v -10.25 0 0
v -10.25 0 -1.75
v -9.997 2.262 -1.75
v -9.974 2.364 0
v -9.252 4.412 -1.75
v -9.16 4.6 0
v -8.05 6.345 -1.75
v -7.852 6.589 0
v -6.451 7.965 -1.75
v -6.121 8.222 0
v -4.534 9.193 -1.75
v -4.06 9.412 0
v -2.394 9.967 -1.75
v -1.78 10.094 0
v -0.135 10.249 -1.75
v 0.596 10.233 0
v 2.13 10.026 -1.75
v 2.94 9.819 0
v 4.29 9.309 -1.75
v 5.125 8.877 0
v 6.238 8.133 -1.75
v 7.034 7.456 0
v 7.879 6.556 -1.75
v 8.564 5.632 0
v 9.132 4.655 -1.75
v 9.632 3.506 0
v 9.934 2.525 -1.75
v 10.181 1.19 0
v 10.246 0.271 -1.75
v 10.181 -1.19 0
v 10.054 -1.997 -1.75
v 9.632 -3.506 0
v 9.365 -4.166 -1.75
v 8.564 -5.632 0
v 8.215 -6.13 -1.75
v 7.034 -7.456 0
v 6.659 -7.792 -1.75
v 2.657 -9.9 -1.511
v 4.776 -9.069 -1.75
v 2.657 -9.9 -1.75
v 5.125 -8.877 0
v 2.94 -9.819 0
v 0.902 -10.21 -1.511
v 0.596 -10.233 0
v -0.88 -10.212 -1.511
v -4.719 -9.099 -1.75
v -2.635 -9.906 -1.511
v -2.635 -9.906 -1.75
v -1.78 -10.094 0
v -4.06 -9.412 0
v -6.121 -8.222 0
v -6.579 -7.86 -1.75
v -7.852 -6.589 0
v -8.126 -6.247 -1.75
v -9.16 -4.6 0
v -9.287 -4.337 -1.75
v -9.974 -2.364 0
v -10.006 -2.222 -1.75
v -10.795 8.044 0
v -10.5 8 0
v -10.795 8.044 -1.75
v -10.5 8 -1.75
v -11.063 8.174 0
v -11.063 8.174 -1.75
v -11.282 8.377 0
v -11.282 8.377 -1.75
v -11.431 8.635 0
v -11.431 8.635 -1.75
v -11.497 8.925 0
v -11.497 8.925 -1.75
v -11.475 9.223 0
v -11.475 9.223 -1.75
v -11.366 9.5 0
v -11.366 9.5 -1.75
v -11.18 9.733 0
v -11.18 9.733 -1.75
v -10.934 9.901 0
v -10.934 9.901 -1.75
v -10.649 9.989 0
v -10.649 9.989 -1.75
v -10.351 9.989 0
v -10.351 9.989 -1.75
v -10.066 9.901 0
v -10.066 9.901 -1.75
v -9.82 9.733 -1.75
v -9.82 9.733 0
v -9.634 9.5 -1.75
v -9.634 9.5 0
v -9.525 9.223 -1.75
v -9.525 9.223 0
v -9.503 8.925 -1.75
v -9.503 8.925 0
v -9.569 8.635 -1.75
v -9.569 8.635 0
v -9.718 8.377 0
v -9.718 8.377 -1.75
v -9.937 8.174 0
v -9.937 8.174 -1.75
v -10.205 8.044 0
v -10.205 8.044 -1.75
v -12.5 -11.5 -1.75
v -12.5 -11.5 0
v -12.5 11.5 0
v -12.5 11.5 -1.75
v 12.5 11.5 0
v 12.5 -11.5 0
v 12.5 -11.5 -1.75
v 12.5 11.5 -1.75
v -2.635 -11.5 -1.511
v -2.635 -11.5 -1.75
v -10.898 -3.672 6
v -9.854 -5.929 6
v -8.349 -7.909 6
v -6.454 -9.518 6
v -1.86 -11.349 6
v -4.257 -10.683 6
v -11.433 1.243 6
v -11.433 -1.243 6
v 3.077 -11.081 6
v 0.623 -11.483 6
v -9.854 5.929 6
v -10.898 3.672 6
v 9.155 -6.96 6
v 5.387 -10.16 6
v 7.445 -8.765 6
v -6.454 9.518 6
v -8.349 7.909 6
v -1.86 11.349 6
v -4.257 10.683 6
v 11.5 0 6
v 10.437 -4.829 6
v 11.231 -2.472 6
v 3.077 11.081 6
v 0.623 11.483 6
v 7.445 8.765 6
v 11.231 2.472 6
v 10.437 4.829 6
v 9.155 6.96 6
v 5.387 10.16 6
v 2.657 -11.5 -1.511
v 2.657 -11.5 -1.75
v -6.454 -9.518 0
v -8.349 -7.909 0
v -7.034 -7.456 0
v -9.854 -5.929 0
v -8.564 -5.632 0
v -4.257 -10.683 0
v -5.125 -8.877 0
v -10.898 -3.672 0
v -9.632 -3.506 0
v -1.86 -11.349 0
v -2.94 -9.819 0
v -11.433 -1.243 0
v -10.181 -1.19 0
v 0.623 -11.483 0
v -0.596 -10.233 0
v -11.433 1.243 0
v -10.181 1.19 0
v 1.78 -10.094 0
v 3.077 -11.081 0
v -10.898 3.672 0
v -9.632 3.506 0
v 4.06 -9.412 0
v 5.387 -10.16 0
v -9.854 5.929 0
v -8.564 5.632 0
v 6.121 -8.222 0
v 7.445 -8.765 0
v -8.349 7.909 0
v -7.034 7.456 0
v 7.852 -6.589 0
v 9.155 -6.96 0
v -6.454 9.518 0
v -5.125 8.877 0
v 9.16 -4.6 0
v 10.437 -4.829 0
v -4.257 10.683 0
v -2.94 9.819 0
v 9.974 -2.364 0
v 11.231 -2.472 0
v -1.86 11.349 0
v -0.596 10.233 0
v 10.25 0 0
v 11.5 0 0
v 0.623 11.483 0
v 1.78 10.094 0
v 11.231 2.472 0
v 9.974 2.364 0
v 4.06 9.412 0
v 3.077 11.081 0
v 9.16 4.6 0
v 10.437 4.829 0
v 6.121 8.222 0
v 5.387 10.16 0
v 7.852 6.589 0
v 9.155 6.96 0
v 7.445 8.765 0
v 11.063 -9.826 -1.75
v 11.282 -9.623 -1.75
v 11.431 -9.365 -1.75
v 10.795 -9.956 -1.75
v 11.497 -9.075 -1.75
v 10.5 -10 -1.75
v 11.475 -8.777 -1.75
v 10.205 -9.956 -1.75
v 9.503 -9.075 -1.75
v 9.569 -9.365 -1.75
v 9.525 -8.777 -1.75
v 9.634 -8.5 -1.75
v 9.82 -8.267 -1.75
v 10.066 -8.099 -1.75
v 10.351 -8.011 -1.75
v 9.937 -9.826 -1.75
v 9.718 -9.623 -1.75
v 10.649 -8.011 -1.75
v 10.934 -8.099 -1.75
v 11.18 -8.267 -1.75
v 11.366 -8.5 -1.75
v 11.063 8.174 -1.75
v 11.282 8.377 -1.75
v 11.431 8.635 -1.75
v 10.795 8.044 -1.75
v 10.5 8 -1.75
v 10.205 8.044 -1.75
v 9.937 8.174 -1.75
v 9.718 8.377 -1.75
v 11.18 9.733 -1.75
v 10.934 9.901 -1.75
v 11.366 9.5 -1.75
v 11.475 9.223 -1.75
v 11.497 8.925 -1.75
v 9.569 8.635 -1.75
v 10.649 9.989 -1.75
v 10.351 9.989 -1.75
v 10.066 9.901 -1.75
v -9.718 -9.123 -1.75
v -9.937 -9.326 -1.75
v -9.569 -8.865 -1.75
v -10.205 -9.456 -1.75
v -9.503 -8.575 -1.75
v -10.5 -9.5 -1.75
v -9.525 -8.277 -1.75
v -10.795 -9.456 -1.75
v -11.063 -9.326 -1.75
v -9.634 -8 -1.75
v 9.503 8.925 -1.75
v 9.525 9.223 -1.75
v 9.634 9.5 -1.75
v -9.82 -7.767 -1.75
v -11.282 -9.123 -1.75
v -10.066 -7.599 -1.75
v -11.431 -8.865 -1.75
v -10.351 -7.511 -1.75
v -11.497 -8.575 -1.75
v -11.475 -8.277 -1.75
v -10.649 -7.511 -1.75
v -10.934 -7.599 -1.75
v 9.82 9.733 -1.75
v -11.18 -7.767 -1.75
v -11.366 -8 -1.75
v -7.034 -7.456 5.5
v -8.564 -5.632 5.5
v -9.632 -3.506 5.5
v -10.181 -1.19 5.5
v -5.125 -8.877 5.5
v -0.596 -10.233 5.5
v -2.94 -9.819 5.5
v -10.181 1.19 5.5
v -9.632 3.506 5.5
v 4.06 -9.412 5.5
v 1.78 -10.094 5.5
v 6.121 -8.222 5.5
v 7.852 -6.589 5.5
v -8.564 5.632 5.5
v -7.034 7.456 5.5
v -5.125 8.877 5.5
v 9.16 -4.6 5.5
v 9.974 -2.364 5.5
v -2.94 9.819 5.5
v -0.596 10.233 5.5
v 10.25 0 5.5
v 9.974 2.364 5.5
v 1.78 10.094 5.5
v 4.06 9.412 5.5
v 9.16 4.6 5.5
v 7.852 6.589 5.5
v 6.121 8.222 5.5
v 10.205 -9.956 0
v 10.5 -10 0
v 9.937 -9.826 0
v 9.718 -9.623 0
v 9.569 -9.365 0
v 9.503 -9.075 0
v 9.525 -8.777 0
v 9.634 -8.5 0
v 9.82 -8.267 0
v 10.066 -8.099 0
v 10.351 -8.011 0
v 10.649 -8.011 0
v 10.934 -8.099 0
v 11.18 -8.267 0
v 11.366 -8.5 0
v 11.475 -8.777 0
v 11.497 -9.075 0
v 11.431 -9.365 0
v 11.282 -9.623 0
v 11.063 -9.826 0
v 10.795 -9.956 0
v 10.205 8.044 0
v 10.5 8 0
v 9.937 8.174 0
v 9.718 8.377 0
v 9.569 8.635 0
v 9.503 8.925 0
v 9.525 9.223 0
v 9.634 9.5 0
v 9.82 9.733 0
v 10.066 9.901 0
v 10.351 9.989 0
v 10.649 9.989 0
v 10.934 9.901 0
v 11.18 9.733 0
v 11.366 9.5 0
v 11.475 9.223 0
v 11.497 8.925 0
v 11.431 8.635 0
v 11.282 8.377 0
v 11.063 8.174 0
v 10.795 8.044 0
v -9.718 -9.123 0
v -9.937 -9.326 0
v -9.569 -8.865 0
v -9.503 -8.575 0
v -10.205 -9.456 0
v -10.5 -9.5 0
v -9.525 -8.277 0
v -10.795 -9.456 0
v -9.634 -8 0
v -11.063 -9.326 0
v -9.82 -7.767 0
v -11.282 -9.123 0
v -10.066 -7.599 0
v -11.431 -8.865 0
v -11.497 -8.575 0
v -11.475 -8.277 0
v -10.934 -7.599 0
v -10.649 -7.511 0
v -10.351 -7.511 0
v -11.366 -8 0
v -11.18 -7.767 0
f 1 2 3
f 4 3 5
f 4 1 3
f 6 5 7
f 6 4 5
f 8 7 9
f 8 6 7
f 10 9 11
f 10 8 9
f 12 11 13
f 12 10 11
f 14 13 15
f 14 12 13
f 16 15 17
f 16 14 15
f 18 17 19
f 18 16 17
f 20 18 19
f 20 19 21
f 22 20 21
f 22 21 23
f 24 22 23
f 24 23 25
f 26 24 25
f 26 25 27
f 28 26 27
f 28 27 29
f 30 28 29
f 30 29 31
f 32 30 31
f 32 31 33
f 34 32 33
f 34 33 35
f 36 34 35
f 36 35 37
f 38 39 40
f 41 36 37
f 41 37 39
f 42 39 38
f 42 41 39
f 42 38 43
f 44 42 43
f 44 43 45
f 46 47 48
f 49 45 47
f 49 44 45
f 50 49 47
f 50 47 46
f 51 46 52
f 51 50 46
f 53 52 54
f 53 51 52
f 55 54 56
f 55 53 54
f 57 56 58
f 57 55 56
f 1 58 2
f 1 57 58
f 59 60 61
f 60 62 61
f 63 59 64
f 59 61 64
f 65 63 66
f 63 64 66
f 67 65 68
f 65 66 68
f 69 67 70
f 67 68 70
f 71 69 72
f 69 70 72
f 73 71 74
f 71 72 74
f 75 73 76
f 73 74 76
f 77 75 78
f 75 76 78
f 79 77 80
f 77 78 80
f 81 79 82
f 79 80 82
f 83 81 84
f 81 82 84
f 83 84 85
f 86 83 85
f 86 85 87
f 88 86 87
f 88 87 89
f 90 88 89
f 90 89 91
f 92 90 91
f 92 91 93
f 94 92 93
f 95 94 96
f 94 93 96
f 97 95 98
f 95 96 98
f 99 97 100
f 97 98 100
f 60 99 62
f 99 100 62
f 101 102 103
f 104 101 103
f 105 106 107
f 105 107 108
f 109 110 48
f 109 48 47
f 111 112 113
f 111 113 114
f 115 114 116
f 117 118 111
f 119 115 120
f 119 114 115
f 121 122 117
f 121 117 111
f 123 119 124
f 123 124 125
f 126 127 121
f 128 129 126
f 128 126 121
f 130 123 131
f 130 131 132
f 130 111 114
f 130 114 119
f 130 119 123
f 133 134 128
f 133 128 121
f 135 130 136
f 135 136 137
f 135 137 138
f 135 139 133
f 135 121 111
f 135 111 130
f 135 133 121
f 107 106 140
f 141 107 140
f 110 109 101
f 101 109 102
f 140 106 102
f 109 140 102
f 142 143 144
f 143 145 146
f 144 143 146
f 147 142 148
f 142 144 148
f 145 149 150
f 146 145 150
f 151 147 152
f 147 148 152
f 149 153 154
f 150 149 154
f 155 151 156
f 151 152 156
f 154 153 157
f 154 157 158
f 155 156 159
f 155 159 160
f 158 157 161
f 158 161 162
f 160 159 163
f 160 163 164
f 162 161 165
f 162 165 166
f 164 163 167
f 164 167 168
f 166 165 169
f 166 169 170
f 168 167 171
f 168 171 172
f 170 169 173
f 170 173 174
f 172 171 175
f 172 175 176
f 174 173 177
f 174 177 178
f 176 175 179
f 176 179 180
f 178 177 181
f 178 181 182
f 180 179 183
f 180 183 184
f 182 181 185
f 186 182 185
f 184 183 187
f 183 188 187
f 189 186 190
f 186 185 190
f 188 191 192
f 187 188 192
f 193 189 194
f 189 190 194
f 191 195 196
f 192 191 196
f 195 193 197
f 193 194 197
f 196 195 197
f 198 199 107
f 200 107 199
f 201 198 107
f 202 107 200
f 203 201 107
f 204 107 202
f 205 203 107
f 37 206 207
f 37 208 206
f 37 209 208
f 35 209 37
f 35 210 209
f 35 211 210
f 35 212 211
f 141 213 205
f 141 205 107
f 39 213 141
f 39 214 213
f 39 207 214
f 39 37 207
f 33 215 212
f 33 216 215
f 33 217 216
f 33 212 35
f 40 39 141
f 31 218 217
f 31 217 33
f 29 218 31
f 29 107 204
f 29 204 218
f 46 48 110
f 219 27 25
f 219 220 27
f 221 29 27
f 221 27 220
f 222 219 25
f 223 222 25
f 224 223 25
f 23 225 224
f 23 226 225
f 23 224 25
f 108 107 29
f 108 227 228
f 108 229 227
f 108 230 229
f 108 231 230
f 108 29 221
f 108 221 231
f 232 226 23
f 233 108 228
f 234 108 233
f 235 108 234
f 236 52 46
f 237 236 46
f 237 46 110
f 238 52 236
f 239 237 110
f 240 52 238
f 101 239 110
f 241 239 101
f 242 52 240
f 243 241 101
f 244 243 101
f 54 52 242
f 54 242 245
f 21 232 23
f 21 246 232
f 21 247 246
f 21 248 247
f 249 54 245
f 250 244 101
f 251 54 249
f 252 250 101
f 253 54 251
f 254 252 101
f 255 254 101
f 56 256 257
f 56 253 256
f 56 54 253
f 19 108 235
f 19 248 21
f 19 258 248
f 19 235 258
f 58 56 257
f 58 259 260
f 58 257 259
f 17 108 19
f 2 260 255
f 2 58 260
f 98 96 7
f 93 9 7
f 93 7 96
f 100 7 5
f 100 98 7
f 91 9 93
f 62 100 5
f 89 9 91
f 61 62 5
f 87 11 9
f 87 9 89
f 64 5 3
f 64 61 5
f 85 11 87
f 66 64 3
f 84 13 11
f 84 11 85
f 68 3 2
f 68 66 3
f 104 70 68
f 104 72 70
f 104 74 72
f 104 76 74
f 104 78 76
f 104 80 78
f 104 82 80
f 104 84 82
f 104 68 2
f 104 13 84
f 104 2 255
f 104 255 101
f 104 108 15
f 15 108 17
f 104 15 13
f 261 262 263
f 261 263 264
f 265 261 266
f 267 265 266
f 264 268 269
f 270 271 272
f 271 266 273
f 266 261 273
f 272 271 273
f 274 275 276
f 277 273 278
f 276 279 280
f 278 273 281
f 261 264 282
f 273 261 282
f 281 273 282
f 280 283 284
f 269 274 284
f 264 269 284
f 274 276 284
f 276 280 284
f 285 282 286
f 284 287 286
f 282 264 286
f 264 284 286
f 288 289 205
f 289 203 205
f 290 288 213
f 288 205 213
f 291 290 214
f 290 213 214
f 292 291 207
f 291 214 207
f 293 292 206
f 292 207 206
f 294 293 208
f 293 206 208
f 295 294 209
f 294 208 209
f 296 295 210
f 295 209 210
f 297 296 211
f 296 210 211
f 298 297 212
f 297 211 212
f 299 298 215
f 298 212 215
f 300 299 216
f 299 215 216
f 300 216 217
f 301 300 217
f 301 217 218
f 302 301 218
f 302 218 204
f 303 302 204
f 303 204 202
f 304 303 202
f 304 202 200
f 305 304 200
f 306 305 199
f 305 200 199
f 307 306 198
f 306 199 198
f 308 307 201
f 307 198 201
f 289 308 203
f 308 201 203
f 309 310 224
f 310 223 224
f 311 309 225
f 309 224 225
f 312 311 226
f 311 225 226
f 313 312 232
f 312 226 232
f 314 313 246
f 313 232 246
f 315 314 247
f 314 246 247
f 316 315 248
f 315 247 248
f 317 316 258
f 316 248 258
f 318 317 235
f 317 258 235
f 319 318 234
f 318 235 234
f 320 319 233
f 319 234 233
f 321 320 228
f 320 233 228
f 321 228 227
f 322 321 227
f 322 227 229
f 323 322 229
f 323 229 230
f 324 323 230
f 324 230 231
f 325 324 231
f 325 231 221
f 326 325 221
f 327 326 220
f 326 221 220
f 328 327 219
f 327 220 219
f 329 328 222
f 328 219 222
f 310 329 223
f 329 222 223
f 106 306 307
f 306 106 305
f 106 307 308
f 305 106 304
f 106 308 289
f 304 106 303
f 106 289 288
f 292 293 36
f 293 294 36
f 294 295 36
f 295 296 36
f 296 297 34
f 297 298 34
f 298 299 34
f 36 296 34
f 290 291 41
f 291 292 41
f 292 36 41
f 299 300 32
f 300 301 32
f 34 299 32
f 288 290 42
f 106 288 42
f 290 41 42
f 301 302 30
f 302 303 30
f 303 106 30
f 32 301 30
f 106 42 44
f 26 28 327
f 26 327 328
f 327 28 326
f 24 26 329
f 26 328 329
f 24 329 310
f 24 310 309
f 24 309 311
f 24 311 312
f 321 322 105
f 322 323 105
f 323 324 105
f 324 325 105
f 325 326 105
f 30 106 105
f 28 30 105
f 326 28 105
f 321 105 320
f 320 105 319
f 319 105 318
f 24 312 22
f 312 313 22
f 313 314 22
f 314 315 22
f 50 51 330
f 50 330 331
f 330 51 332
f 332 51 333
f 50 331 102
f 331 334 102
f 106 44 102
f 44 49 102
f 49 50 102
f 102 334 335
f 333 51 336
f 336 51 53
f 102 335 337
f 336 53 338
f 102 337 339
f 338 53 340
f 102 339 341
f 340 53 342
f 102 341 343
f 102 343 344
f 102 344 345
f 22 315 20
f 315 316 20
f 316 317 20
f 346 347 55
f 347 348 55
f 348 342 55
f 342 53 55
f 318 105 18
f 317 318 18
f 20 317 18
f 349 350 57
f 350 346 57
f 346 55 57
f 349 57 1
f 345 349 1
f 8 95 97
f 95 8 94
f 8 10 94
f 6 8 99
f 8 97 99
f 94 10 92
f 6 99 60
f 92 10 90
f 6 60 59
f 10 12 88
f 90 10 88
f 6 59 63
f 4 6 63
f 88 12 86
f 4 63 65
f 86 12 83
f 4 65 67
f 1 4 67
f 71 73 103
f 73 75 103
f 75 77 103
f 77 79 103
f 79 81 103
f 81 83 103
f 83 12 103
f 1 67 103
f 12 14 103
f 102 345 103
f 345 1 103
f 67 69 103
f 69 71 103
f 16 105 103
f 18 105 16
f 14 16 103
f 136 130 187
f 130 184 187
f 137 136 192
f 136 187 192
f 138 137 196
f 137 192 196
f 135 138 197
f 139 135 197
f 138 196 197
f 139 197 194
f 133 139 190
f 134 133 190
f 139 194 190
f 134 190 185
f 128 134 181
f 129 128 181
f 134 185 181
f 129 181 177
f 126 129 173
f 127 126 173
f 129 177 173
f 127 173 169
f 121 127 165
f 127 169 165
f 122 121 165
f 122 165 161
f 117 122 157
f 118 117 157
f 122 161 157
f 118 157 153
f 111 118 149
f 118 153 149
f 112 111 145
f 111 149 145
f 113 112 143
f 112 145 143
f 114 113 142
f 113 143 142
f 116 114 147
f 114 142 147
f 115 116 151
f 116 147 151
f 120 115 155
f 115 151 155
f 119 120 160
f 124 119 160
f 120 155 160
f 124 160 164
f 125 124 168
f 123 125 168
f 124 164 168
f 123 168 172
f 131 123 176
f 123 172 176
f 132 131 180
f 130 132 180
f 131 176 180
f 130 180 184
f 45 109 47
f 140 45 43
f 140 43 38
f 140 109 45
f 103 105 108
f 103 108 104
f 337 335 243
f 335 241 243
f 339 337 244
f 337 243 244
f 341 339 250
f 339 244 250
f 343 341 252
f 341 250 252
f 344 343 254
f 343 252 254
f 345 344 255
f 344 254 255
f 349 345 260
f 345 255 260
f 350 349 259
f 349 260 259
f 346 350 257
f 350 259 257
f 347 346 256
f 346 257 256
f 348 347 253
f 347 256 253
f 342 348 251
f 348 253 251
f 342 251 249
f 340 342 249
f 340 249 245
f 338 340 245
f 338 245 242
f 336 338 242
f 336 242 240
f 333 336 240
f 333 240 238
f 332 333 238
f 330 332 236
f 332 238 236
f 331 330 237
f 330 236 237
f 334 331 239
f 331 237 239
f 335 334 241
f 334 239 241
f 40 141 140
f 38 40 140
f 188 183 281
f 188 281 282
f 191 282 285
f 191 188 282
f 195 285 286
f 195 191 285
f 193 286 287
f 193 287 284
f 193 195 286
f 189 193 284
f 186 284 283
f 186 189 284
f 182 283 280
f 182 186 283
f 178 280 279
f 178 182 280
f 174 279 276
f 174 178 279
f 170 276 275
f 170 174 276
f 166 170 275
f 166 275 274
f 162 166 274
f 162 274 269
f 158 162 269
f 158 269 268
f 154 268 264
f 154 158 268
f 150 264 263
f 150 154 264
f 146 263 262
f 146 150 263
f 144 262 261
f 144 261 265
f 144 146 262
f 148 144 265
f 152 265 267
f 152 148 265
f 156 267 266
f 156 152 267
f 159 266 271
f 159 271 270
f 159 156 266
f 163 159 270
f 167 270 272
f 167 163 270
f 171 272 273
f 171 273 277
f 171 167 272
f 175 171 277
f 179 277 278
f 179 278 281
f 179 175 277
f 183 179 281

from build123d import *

# Parameters (mm, degrees)
SKETCH1_R                            = 11.5
SKETCH1_R_2                          = 10.25
BOSS_EXTRUDE1_DEPTH                  = 5.5
SKETCH2_R                            = 11.5
BOSS_EXTRUDE2_DEPTH                  = 0.5
SKETCH3_W                            = 25
SKETCH3_H                            = 23
SKETCH3_R                            = 10.25
BOSS_EXTRUDE3_DEPTH                  = 1.75
SKETCH4_W                            = 5.291507385
SKETCH4_H                            = 0.239377866
CUT_EXTRUDE1_DEPTH                   = 5
SKETCH5_W                            = 1
SKETCH5_H                            = 1.75
TAP_DRILL_FOR_M2X0_4_TAP1_AT_2_COUNT = 2
TAP_DRILL_FOR_M2X0_4_TAP1_AT_2_PITCH = 21
TAP_DRILL_FOR_M2X0_4_TAP1_AT_3_COUNT = 2
TAP_DRILL_FOR_M2X0_4_TAP1_AT_3_PITCH = 27.658633372
TAP_DRILL_FOR_M2X0_4_TAP1_AT_4_COUNT = 2
TAP_DRILL_FOR_M2X0_4_TAP1_AT_4_PITCH = 17.5


with BuildPart() as part:
    # Sketch1 → Boss-Extrude1 (new body)
    with BuildSketch(Plane.XY):
        Circle(SKETCH1_R)
        Circle(SKETCH1_R_2, mode=Mode.SUBTRACT)
    extrude(amount=BOSS_EXTRUDE1_DEPTH)

    # Sketch2 → Boss-Extrude2 (add)
    with BuildSketch(Plane.XY.offset(5.5)):
        Circle(SKETCH2_R)
    extrude(amount=BOSS_EXTRUDE2_DEPTH)


with BuildPart() as body_2:
    # Sketch3 → Boss-Extrude3 (new body)
    with BuildSketch(Plane(origin=(0, 0, 0), x_dir=(-1, 0, 0), z_dir=(0, 0, -1))):
        Rectangle(SKETCH3_W, SKETCH3_H)
        Circle(SKETCH3_R, mode=Mode.SUBTRACT)
    extrude(amount=BOSS_EXTRUDE3_DEPTH)

    # Sketch4 → Cut-Extrude1 (cut)
    with BuildSketch(Plane.XZ.offset(11.5)):
        with Locations((0.010767951, -1.630311067)):
            Rectangle(SKETCH4_W, SKETCH4_H)
    extrude(amount=-CUT_EXTRUDE1_DEPTH, mode=Mode.SUBTRACT)

    # Sketch5 → Tap Drill for M2x0.4 Tap1 (revolve, cut)
    with BuildSketch(Plane(origin=(-10.5, 9, 0), x_dir=(0, -1, 0), z_dir=(1, 0, 0))):
        with Locations((0.5, 0.875)):
            Rectangle(SKETCH5_W, SKETCH5_H)
    tap_drill_for_m2x0_4_tap1 = revolve(axis=Axis((-10.5, 9, 6.35), (0, 0, -1)), mode=Mode.SUBTRACT)

    # Tap Drill for M2x0.4 Tap1 at 2: Tap Drill for M2x0.4 Tap1 ×2
    with Locations(*[(i * TAP_DRILL_FOR_M2X0_4_TAP1_AT_2_PITCH, 0, 0) for i in range(1, TAP_DRILL_FOR_M2X0_4_TAP1_AT_2_COUNT)]):
        add(tap_drill_for_m2x0_4_tap1, mode=Mode.SUBTRACT)

    # Tap Drill for M2x0.4 Tap1 at 3: Tap Drill for M2x0.4 Tap1 ×2
    with Locations(*[Vector(0.7592566023652966, -0.6507913734559686, 0) * (i * TAP_DRILL_FOR_M2X0_4_TAP1_AT_3_PITCH) for i in range(1, TAP_DRILL_FOR_M2X0_4_TAP1_AT_3_COUNT)]):
        add(tap_drill_for_m2x0_4_tap1, mode=Mode.SUBTRACT)

    # Tap Drill for M2x0.4 Tap1 at 4: Tap Drill for M2x0.4 Tap1 ×2
    with Locations(*[(0, -i * TAP_DRILL_FOR_M2X0_4_TAP1_AT_4_PITCH, 0) for i in range(1, TAP_DRILL_FOR_M2X0_4_TAP1_AT_4_COUNT)]):
        add(tap_drill_for_m2x0_4_tap1, mode=Mode.SUBTRACT)


solid = Compound([part.part, body_2.part])
